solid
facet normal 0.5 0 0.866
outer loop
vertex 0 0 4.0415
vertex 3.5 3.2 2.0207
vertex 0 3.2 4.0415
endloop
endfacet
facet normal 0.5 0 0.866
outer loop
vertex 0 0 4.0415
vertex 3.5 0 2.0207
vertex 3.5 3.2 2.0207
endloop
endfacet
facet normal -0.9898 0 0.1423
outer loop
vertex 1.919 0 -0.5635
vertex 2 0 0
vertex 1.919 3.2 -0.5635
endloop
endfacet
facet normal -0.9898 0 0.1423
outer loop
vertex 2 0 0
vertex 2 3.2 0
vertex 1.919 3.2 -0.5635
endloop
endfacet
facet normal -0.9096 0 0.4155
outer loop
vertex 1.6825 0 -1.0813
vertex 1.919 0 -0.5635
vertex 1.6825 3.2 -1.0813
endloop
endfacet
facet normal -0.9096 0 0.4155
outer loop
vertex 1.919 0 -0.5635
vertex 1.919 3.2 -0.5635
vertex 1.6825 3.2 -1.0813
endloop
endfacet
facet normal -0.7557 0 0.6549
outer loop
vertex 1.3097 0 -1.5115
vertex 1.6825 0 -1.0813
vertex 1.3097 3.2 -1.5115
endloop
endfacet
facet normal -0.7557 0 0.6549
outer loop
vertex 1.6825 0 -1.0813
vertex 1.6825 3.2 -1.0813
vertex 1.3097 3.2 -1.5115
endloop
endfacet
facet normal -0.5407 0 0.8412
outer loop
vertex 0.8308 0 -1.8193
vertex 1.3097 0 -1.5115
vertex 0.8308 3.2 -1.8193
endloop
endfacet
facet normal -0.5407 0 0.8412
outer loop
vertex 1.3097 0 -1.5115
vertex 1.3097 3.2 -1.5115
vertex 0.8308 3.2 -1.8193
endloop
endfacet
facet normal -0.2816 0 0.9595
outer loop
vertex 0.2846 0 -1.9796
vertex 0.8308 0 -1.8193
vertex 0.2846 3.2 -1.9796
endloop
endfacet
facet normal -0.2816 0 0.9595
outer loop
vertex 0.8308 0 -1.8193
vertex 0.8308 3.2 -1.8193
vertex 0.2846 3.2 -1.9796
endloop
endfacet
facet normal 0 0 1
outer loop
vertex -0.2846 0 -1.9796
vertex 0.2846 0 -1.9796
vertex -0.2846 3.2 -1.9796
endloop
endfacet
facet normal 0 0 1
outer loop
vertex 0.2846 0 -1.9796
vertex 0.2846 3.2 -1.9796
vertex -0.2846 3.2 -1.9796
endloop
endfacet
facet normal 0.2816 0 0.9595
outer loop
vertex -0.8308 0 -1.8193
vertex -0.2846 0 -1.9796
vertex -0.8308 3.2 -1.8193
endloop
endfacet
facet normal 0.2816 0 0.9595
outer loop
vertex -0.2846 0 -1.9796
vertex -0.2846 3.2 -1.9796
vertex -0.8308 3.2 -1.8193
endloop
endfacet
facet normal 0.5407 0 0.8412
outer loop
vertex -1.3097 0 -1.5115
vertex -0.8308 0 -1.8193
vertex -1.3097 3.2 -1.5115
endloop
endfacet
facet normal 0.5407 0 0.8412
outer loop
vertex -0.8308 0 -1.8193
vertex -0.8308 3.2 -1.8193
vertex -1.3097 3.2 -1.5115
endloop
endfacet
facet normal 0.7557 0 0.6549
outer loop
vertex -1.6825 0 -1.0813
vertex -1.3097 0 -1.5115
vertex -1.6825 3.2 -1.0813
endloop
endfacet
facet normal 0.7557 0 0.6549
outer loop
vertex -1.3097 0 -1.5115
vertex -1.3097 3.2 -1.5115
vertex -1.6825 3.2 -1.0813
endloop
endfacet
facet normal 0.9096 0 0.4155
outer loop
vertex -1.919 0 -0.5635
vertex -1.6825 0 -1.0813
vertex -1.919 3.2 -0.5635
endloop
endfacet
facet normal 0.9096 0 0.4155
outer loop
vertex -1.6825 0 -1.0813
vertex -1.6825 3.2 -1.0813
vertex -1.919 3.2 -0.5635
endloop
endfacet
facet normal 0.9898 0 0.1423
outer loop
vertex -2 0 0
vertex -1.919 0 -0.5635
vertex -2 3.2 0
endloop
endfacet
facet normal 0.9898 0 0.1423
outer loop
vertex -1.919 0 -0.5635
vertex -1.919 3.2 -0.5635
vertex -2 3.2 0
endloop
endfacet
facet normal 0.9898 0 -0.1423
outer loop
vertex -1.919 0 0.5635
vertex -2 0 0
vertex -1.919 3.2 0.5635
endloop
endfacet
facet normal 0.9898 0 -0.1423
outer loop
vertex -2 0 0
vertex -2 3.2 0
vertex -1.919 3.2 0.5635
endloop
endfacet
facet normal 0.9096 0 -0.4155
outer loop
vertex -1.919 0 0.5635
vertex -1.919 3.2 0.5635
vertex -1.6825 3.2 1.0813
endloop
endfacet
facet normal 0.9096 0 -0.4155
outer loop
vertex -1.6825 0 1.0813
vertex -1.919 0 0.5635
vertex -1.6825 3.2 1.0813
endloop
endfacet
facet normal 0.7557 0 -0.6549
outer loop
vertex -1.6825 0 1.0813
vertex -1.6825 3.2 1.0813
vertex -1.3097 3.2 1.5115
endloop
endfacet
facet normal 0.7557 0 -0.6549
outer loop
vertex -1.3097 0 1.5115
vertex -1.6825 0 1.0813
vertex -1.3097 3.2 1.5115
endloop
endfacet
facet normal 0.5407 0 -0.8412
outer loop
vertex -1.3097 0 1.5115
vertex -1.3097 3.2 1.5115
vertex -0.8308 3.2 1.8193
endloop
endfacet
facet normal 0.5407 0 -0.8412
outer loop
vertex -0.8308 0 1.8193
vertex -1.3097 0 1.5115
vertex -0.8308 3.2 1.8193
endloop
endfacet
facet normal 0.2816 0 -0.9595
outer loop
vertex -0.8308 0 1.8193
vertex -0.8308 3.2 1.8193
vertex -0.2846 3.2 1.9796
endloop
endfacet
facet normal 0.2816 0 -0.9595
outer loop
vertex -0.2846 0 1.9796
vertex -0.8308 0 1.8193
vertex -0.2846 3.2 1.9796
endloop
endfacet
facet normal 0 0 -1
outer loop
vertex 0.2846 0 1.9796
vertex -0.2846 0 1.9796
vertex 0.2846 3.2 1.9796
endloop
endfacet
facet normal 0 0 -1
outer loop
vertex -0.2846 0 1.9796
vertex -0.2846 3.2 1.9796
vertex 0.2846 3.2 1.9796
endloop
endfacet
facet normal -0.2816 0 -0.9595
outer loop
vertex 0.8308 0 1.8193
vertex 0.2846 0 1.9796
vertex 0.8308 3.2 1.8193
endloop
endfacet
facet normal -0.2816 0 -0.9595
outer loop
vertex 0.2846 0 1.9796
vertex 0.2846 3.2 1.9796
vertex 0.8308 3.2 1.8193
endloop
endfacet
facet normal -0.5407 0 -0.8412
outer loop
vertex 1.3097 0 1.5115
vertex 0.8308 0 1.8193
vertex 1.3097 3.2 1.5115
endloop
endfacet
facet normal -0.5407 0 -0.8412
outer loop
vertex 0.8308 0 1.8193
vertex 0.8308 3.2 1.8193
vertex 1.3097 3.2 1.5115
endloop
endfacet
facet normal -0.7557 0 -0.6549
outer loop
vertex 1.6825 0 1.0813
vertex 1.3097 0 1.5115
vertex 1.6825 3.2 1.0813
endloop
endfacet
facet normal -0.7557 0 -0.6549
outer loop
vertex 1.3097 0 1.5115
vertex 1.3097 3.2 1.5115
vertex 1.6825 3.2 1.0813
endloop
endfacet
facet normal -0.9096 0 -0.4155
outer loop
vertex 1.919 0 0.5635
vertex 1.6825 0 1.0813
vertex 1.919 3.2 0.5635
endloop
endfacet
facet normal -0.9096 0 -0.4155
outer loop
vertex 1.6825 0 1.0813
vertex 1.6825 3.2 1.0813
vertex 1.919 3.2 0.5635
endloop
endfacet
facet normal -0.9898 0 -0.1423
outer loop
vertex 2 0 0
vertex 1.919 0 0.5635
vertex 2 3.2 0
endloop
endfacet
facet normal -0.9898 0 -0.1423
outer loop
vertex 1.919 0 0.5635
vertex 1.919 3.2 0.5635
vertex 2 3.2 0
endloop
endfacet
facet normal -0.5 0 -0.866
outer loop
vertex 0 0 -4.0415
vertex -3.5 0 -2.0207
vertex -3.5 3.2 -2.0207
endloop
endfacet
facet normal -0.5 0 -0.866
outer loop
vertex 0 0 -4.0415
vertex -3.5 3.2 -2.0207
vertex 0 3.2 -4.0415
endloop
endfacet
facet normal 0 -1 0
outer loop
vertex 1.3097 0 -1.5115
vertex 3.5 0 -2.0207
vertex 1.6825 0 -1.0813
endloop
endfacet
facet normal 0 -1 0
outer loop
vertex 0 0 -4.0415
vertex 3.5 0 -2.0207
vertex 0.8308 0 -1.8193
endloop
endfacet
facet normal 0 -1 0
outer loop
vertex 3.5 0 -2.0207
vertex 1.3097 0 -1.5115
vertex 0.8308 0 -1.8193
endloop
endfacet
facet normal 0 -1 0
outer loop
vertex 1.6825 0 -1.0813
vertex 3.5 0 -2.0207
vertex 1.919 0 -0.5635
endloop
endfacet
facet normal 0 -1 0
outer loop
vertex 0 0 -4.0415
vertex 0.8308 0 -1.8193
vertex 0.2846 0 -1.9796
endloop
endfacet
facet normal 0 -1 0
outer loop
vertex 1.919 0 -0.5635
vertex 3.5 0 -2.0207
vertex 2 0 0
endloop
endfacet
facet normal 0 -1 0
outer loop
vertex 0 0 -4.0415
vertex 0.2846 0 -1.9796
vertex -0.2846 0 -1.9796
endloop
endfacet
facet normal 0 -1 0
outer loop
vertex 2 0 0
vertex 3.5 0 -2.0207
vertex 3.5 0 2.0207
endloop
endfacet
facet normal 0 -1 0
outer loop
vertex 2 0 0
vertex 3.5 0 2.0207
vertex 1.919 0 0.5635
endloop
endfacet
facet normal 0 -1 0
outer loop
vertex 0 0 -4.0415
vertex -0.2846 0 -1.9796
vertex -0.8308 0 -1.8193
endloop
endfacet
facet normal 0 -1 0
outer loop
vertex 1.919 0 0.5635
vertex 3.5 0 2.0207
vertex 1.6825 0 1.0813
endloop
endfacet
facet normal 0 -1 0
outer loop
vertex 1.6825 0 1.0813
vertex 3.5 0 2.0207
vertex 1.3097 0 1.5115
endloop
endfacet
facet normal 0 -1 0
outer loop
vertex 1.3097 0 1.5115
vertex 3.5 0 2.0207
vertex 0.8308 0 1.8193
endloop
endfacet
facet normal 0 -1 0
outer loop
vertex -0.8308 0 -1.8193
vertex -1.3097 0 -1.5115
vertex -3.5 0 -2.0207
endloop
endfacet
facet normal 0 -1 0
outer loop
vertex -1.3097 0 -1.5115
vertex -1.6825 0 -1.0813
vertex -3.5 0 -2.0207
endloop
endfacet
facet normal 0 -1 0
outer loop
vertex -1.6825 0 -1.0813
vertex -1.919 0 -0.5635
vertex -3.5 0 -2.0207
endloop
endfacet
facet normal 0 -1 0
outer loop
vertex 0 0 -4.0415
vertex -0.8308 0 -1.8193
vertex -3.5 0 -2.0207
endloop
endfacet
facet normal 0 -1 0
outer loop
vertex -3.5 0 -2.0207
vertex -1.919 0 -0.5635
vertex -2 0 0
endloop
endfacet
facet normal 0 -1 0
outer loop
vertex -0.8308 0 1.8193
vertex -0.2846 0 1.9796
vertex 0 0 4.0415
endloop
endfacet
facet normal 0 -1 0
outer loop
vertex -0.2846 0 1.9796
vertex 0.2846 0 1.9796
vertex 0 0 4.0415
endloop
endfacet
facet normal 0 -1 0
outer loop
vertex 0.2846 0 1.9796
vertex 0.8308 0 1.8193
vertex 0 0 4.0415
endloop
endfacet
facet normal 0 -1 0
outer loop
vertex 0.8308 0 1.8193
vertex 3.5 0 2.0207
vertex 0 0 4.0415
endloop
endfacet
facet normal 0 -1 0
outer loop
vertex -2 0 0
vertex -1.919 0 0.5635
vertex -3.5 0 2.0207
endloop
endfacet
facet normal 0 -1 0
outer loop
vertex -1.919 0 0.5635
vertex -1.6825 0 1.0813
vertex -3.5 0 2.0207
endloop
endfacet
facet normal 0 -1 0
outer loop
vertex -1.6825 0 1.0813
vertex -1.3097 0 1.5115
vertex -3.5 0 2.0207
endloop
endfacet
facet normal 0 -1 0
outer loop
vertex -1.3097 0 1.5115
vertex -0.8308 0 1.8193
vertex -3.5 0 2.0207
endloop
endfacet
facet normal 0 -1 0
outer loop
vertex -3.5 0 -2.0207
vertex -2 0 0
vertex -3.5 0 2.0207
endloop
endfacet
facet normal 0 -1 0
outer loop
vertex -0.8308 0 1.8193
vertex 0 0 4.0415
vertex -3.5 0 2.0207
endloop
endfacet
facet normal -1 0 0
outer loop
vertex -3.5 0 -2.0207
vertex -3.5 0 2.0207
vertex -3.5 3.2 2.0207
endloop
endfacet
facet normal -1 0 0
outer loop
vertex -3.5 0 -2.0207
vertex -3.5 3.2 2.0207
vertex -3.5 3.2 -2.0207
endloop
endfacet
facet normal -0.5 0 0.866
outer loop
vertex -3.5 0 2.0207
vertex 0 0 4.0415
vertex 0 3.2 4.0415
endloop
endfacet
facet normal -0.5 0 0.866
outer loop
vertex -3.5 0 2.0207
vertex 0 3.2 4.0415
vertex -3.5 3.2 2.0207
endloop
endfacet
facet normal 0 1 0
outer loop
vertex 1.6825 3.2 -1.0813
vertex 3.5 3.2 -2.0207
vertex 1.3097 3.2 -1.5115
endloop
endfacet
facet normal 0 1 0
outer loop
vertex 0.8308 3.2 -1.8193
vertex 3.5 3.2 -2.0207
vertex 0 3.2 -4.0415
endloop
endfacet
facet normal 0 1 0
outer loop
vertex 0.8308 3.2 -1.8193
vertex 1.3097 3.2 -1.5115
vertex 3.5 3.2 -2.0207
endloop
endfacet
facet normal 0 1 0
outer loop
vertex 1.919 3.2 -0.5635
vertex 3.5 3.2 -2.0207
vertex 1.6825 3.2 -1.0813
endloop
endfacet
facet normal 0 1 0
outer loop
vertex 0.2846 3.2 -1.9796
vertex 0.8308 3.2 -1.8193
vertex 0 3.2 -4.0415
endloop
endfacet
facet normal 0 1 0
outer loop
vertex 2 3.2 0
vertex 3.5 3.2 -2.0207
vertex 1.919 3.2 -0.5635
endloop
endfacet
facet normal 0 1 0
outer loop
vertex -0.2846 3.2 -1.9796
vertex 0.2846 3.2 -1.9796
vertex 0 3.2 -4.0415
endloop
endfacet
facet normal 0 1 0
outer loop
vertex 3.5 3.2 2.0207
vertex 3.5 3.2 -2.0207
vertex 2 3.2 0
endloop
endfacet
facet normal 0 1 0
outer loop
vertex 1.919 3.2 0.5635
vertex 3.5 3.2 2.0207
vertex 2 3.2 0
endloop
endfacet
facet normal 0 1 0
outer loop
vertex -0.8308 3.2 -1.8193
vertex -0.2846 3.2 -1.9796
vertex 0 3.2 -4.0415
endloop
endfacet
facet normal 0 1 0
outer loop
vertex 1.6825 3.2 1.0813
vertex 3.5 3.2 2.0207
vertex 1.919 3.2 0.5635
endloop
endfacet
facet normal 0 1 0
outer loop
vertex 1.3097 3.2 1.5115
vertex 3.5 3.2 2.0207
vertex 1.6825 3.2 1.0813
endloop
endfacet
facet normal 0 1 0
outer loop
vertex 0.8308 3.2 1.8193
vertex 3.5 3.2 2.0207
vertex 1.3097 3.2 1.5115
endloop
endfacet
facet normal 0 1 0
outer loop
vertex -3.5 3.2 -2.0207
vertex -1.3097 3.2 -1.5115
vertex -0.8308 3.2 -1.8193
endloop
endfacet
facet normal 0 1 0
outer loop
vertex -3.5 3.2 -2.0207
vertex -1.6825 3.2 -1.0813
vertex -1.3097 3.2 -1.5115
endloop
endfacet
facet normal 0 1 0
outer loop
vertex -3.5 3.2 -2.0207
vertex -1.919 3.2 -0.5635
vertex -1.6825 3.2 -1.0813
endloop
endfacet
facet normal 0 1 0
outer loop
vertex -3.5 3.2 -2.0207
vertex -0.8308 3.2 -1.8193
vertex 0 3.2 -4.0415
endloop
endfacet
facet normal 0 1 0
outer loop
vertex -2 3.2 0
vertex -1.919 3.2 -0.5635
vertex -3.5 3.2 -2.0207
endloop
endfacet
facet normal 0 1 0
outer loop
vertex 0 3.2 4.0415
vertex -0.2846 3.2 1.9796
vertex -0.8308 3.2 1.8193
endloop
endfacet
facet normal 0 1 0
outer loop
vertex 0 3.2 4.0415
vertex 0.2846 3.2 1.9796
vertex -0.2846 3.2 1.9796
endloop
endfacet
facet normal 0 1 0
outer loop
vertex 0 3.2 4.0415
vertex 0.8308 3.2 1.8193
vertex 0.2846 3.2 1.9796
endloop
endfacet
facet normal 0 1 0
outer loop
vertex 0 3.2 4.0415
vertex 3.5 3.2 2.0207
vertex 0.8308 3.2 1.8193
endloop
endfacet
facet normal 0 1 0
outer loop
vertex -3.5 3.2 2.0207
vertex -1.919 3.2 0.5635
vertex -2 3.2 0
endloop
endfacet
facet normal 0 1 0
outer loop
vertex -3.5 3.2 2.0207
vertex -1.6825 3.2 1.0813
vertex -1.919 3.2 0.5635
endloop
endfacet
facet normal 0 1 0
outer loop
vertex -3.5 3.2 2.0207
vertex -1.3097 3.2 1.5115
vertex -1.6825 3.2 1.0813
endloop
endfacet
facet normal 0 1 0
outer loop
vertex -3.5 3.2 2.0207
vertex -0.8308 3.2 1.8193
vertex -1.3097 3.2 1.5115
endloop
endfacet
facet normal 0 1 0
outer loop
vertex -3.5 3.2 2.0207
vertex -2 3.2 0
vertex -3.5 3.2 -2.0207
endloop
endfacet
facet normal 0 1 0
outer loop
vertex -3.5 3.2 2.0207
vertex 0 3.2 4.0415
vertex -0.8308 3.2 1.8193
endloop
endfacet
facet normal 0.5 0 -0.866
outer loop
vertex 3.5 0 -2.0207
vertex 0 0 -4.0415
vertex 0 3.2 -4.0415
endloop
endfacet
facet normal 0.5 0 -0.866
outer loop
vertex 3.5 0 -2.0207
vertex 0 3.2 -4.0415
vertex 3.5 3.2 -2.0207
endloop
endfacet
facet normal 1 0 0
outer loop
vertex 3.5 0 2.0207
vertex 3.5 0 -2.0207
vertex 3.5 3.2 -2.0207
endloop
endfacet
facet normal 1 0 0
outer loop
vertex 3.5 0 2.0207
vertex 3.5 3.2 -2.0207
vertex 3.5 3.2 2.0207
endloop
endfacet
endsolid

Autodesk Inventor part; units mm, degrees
ref_plane "YZ Plane" through (0, 0, 0) normal (1, 0, 0) x (0, 1, 0)
ref_plane "XZ Plane" through (0, 0, 0) normal (0, 1, 0) x (-1, 0, 0)
ref_plane "XY Plane" through (0, 0, 0) normal (0, 0, 1) x (1, 0, 0)
sketch "Sketch1" plane through (0, 0, 0) normal (0, 1, 0) x (-1, 0, 0)
  line L0 (0, 4.0415) -> (3.5, 2.0207)
  line L1 (3.5, 2.0207) -> (3.5, -2.0207)
  line L2 (3.5, -2.0207) -> (0, -4.0415)
  line L3 (0, -4.0415) -> (-3.5, -2.0207)
  line L4 (-3.5, -2.0207) -> (-3.5, 2.0207)
  line L5 (-3.5, 2.0207) -> (0, 4.0415)
  point P0 (0, 0)
  point P1 (0, 0)
  dimension "d0" = 3.5
extrude "Extrusion1" add sketch "Sketch1" along normal blind 3.2
sketch "Sketch2" plane through (0, 3.2, 0) normal (0, 1, 0) x (1, 0, 0)
  circle A0 centre (0, 0) radius 2
  dimension "d3" = 4
extrude "Extrusion2" cut sketch "Sketch2" against normal blind 4.3
thread "Thread1" size "M4x0.7" class "6H" standard "ANSI Metric M Profile" full length
properties part number "M4Nut" material "Steel, Alloy"
